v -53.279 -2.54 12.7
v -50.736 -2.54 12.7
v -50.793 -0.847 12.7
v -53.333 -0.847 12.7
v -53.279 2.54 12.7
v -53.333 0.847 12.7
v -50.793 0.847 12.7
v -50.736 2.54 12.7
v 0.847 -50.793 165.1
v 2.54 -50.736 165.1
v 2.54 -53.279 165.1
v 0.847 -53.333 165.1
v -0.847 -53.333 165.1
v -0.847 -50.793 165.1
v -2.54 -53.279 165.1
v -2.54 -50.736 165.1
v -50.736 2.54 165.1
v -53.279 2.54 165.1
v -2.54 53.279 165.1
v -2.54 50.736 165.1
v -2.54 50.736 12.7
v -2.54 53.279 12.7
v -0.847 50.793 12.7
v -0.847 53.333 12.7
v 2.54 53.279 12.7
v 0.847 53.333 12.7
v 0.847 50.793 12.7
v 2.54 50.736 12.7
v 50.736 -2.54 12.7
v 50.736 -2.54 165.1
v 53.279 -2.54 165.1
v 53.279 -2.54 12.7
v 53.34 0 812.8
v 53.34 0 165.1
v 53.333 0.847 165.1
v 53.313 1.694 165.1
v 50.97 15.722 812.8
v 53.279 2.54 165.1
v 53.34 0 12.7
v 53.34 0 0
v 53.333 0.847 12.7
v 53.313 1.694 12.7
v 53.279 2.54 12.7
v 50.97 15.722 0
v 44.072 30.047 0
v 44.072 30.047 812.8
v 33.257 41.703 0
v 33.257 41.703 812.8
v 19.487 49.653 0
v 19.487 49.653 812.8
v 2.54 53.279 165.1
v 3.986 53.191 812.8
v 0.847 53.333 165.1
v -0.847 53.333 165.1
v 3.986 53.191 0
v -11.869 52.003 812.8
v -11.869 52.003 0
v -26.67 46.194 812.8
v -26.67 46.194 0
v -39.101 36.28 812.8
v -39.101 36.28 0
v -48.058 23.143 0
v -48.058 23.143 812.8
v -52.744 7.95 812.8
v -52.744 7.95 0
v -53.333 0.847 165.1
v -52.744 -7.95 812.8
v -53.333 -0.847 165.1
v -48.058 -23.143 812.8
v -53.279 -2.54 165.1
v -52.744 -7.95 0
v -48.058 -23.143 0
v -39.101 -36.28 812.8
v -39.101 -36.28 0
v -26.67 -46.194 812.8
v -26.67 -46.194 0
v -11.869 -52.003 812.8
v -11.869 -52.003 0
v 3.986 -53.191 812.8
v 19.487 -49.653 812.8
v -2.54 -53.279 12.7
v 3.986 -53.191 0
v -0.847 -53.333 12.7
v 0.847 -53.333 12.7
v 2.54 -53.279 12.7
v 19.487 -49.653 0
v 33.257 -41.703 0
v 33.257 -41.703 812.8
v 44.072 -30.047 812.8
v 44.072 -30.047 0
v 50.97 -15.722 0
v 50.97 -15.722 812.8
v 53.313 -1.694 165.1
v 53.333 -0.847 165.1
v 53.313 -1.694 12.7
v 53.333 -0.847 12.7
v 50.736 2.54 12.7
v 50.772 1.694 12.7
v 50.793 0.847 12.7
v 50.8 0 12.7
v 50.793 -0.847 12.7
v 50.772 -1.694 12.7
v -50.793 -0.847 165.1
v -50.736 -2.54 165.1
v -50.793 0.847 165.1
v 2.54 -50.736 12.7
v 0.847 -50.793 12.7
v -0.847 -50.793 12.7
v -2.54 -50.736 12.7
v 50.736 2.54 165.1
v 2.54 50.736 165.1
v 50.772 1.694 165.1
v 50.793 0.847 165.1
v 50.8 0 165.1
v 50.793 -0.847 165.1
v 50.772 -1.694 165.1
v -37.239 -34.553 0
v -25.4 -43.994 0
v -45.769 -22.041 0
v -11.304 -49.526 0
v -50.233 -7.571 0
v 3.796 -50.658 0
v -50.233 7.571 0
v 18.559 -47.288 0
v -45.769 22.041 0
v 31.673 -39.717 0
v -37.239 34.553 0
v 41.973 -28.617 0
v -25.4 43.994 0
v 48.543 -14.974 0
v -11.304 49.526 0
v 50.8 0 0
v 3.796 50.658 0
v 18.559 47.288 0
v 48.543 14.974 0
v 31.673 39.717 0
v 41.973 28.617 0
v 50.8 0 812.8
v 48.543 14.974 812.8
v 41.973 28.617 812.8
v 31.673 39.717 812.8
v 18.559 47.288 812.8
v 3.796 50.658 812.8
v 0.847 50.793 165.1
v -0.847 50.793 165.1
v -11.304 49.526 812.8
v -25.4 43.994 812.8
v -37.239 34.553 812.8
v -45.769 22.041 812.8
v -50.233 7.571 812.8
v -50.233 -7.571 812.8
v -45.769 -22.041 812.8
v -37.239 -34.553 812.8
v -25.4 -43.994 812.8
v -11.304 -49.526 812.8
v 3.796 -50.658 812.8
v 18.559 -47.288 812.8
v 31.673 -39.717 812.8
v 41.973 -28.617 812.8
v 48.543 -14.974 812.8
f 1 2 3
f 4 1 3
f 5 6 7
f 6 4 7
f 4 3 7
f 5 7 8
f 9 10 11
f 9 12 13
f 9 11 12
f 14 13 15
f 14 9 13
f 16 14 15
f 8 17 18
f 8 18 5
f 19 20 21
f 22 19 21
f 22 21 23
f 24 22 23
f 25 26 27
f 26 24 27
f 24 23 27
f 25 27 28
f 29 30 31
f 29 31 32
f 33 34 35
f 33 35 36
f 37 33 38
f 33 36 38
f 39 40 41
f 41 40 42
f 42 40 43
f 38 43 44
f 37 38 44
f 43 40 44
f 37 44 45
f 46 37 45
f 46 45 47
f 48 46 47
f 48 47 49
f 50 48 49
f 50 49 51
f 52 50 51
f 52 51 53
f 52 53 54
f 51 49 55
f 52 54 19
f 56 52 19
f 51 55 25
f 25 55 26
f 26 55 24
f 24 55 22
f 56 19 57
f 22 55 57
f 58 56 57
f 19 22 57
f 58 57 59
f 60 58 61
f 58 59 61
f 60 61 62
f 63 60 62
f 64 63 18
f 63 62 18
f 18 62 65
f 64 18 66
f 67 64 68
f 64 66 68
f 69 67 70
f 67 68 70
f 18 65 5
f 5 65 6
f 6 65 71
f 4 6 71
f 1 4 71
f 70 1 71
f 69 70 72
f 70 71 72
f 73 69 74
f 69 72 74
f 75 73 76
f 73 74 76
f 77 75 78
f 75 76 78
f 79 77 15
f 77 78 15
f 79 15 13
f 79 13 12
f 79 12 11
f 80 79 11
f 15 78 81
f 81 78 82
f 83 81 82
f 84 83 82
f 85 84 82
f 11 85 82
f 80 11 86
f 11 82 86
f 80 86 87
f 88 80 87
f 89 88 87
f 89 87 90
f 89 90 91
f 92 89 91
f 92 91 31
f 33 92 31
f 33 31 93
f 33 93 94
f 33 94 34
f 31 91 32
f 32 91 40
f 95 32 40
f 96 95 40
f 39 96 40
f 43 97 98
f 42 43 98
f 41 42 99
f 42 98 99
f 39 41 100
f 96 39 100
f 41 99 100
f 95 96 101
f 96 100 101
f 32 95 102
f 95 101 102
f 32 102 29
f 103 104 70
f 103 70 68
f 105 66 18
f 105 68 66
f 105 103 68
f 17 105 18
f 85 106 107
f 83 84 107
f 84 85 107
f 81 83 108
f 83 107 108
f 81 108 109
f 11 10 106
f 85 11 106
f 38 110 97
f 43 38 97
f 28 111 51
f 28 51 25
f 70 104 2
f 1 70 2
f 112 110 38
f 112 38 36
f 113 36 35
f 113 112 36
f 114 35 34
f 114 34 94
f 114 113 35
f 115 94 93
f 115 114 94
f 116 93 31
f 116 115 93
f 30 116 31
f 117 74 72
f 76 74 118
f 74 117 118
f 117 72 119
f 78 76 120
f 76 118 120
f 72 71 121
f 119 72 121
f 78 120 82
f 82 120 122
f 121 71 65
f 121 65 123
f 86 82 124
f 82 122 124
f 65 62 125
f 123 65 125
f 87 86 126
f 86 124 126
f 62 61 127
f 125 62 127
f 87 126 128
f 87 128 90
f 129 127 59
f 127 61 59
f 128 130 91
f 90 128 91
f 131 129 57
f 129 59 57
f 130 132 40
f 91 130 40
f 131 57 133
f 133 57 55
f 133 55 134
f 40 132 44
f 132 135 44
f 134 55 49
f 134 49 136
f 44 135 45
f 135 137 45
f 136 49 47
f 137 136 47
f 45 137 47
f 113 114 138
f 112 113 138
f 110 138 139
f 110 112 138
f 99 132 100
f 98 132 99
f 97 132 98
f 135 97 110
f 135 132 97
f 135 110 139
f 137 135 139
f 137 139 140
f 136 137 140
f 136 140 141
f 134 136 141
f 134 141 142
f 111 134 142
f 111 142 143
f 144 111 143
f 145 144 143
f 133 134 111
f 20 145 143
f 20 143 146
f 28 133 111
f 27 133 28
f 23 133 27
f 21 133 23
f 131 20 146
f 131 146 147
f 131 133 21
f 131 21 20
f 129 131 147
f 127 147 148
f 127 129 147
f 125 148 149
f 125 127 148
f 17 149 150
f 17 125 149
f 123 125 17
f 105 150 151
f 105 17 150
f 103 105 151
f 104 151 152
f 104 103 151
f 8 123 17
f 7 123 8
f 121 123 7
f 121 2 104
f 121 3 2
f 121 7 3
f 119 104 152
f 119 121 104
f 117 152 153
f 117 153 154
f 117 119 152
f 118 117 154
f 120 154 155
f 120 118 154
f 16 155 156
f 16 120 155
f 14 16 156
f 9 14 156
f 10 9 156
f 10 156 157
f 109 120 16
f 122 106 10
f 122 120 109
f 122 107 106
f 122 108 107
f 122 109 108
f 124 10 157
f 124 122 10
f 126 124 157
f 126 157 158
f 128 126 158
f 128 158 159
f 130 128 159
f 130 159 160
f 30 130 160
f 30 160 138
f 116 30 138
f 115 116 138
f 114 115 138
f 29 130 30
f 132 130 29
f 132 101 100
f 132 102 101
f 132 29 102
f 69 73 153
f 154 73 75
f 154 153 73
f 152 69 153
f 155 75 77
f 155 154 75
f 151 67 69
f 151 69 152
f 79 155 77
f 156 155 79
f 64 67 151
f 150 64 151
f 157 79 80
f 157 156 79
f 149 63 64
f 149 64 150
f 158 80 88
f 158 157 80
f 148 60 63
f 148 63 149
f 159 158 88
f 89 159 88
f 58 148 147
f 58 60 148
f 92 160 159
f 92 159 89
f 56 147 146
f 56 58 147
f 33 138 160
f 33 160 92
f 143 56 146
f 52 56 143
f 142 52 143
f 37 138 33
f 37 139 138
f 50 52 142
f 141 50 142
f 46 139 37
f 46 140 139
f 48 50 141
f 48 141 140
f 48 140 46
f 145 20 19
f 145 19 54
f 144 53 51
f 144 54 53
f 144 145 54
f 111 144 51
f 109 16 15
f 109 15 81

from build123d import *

# Parameters (mm, degrees)
SKETCH1_R               = 53.34
SKETCH1_R_2             = 50.8
BOSS_EXTRUDE1_DEPTH     = 812.8
CUT_EXTRUDE1_REACH      = 818.293
CUT_EXTRUDE1_END_RADIUS = 53.34
SKETCH2_W               = 152.4
SKETCH2_H               = 5.08
CIRPATTERN1_COUNT       = 4


with BuildPart() as part:
    # Sketch1 → Boss-Extrude1 (new body)
    with BuildSketch(Plane.XY):
        Circle(SKETCH1_R)
        Circle(SKETCH1_R_2, mode=Mode.SUBTRACT)
    extrude(amount=BOSS_EXTRUDE1_DEPTH)

    # Cut-Extrude1: up to this cylinder (the profile starts inside it)
    cut_extrude1_end = Plane(origin=(0, 0, 88.9), z_dir=(0, 0, -1)) * Cylinder(CUT_EXTRUDE1_END_RADIUS, 1744.266, mode=Mode.PRIVATE)
    # Sketch2 → Cut-Extrude1 (cut, up to the surface)
    with BuildSketch(Plane(origin=(0, 0, 0), x_dir=(0, 0, -1), z_dir=(1, 0, 0)), mode=Mode.PRIVATE) as cut_extrude1_sk1:
        with Locations((-88.9, 0)):
            Rectangle(SKETCH2_W, SKETCH2_H)
    cut_extrude1_tool1 = extrude(cut_extrude1_sk1.sketch, amount=-CUT_EXTRUDE1_REACH, mode=Mode.PRIVATE) & cut_extrude1_end
    cut_extrude1 = cut_extrude1_tool1.solids().sort_by_distance((0, 0, 88.9))[0]
    add(cut_extrude1, mode=Mode.SUBTRACT)

    # CirPattern1: Cut-Extrude1 ×4 about axis
    cirpattern1_axis = Axis((0, 0, 0), (0, 0, 1))
    for i in range(1, CIRPATTERN1_COUNT):
        add(cut_extrude1.rotate(cirpattern1_axis, i * 360 / CIRPATTERN1_COUNT), mode=Mode.SUBTRACT)


solid = part.part
